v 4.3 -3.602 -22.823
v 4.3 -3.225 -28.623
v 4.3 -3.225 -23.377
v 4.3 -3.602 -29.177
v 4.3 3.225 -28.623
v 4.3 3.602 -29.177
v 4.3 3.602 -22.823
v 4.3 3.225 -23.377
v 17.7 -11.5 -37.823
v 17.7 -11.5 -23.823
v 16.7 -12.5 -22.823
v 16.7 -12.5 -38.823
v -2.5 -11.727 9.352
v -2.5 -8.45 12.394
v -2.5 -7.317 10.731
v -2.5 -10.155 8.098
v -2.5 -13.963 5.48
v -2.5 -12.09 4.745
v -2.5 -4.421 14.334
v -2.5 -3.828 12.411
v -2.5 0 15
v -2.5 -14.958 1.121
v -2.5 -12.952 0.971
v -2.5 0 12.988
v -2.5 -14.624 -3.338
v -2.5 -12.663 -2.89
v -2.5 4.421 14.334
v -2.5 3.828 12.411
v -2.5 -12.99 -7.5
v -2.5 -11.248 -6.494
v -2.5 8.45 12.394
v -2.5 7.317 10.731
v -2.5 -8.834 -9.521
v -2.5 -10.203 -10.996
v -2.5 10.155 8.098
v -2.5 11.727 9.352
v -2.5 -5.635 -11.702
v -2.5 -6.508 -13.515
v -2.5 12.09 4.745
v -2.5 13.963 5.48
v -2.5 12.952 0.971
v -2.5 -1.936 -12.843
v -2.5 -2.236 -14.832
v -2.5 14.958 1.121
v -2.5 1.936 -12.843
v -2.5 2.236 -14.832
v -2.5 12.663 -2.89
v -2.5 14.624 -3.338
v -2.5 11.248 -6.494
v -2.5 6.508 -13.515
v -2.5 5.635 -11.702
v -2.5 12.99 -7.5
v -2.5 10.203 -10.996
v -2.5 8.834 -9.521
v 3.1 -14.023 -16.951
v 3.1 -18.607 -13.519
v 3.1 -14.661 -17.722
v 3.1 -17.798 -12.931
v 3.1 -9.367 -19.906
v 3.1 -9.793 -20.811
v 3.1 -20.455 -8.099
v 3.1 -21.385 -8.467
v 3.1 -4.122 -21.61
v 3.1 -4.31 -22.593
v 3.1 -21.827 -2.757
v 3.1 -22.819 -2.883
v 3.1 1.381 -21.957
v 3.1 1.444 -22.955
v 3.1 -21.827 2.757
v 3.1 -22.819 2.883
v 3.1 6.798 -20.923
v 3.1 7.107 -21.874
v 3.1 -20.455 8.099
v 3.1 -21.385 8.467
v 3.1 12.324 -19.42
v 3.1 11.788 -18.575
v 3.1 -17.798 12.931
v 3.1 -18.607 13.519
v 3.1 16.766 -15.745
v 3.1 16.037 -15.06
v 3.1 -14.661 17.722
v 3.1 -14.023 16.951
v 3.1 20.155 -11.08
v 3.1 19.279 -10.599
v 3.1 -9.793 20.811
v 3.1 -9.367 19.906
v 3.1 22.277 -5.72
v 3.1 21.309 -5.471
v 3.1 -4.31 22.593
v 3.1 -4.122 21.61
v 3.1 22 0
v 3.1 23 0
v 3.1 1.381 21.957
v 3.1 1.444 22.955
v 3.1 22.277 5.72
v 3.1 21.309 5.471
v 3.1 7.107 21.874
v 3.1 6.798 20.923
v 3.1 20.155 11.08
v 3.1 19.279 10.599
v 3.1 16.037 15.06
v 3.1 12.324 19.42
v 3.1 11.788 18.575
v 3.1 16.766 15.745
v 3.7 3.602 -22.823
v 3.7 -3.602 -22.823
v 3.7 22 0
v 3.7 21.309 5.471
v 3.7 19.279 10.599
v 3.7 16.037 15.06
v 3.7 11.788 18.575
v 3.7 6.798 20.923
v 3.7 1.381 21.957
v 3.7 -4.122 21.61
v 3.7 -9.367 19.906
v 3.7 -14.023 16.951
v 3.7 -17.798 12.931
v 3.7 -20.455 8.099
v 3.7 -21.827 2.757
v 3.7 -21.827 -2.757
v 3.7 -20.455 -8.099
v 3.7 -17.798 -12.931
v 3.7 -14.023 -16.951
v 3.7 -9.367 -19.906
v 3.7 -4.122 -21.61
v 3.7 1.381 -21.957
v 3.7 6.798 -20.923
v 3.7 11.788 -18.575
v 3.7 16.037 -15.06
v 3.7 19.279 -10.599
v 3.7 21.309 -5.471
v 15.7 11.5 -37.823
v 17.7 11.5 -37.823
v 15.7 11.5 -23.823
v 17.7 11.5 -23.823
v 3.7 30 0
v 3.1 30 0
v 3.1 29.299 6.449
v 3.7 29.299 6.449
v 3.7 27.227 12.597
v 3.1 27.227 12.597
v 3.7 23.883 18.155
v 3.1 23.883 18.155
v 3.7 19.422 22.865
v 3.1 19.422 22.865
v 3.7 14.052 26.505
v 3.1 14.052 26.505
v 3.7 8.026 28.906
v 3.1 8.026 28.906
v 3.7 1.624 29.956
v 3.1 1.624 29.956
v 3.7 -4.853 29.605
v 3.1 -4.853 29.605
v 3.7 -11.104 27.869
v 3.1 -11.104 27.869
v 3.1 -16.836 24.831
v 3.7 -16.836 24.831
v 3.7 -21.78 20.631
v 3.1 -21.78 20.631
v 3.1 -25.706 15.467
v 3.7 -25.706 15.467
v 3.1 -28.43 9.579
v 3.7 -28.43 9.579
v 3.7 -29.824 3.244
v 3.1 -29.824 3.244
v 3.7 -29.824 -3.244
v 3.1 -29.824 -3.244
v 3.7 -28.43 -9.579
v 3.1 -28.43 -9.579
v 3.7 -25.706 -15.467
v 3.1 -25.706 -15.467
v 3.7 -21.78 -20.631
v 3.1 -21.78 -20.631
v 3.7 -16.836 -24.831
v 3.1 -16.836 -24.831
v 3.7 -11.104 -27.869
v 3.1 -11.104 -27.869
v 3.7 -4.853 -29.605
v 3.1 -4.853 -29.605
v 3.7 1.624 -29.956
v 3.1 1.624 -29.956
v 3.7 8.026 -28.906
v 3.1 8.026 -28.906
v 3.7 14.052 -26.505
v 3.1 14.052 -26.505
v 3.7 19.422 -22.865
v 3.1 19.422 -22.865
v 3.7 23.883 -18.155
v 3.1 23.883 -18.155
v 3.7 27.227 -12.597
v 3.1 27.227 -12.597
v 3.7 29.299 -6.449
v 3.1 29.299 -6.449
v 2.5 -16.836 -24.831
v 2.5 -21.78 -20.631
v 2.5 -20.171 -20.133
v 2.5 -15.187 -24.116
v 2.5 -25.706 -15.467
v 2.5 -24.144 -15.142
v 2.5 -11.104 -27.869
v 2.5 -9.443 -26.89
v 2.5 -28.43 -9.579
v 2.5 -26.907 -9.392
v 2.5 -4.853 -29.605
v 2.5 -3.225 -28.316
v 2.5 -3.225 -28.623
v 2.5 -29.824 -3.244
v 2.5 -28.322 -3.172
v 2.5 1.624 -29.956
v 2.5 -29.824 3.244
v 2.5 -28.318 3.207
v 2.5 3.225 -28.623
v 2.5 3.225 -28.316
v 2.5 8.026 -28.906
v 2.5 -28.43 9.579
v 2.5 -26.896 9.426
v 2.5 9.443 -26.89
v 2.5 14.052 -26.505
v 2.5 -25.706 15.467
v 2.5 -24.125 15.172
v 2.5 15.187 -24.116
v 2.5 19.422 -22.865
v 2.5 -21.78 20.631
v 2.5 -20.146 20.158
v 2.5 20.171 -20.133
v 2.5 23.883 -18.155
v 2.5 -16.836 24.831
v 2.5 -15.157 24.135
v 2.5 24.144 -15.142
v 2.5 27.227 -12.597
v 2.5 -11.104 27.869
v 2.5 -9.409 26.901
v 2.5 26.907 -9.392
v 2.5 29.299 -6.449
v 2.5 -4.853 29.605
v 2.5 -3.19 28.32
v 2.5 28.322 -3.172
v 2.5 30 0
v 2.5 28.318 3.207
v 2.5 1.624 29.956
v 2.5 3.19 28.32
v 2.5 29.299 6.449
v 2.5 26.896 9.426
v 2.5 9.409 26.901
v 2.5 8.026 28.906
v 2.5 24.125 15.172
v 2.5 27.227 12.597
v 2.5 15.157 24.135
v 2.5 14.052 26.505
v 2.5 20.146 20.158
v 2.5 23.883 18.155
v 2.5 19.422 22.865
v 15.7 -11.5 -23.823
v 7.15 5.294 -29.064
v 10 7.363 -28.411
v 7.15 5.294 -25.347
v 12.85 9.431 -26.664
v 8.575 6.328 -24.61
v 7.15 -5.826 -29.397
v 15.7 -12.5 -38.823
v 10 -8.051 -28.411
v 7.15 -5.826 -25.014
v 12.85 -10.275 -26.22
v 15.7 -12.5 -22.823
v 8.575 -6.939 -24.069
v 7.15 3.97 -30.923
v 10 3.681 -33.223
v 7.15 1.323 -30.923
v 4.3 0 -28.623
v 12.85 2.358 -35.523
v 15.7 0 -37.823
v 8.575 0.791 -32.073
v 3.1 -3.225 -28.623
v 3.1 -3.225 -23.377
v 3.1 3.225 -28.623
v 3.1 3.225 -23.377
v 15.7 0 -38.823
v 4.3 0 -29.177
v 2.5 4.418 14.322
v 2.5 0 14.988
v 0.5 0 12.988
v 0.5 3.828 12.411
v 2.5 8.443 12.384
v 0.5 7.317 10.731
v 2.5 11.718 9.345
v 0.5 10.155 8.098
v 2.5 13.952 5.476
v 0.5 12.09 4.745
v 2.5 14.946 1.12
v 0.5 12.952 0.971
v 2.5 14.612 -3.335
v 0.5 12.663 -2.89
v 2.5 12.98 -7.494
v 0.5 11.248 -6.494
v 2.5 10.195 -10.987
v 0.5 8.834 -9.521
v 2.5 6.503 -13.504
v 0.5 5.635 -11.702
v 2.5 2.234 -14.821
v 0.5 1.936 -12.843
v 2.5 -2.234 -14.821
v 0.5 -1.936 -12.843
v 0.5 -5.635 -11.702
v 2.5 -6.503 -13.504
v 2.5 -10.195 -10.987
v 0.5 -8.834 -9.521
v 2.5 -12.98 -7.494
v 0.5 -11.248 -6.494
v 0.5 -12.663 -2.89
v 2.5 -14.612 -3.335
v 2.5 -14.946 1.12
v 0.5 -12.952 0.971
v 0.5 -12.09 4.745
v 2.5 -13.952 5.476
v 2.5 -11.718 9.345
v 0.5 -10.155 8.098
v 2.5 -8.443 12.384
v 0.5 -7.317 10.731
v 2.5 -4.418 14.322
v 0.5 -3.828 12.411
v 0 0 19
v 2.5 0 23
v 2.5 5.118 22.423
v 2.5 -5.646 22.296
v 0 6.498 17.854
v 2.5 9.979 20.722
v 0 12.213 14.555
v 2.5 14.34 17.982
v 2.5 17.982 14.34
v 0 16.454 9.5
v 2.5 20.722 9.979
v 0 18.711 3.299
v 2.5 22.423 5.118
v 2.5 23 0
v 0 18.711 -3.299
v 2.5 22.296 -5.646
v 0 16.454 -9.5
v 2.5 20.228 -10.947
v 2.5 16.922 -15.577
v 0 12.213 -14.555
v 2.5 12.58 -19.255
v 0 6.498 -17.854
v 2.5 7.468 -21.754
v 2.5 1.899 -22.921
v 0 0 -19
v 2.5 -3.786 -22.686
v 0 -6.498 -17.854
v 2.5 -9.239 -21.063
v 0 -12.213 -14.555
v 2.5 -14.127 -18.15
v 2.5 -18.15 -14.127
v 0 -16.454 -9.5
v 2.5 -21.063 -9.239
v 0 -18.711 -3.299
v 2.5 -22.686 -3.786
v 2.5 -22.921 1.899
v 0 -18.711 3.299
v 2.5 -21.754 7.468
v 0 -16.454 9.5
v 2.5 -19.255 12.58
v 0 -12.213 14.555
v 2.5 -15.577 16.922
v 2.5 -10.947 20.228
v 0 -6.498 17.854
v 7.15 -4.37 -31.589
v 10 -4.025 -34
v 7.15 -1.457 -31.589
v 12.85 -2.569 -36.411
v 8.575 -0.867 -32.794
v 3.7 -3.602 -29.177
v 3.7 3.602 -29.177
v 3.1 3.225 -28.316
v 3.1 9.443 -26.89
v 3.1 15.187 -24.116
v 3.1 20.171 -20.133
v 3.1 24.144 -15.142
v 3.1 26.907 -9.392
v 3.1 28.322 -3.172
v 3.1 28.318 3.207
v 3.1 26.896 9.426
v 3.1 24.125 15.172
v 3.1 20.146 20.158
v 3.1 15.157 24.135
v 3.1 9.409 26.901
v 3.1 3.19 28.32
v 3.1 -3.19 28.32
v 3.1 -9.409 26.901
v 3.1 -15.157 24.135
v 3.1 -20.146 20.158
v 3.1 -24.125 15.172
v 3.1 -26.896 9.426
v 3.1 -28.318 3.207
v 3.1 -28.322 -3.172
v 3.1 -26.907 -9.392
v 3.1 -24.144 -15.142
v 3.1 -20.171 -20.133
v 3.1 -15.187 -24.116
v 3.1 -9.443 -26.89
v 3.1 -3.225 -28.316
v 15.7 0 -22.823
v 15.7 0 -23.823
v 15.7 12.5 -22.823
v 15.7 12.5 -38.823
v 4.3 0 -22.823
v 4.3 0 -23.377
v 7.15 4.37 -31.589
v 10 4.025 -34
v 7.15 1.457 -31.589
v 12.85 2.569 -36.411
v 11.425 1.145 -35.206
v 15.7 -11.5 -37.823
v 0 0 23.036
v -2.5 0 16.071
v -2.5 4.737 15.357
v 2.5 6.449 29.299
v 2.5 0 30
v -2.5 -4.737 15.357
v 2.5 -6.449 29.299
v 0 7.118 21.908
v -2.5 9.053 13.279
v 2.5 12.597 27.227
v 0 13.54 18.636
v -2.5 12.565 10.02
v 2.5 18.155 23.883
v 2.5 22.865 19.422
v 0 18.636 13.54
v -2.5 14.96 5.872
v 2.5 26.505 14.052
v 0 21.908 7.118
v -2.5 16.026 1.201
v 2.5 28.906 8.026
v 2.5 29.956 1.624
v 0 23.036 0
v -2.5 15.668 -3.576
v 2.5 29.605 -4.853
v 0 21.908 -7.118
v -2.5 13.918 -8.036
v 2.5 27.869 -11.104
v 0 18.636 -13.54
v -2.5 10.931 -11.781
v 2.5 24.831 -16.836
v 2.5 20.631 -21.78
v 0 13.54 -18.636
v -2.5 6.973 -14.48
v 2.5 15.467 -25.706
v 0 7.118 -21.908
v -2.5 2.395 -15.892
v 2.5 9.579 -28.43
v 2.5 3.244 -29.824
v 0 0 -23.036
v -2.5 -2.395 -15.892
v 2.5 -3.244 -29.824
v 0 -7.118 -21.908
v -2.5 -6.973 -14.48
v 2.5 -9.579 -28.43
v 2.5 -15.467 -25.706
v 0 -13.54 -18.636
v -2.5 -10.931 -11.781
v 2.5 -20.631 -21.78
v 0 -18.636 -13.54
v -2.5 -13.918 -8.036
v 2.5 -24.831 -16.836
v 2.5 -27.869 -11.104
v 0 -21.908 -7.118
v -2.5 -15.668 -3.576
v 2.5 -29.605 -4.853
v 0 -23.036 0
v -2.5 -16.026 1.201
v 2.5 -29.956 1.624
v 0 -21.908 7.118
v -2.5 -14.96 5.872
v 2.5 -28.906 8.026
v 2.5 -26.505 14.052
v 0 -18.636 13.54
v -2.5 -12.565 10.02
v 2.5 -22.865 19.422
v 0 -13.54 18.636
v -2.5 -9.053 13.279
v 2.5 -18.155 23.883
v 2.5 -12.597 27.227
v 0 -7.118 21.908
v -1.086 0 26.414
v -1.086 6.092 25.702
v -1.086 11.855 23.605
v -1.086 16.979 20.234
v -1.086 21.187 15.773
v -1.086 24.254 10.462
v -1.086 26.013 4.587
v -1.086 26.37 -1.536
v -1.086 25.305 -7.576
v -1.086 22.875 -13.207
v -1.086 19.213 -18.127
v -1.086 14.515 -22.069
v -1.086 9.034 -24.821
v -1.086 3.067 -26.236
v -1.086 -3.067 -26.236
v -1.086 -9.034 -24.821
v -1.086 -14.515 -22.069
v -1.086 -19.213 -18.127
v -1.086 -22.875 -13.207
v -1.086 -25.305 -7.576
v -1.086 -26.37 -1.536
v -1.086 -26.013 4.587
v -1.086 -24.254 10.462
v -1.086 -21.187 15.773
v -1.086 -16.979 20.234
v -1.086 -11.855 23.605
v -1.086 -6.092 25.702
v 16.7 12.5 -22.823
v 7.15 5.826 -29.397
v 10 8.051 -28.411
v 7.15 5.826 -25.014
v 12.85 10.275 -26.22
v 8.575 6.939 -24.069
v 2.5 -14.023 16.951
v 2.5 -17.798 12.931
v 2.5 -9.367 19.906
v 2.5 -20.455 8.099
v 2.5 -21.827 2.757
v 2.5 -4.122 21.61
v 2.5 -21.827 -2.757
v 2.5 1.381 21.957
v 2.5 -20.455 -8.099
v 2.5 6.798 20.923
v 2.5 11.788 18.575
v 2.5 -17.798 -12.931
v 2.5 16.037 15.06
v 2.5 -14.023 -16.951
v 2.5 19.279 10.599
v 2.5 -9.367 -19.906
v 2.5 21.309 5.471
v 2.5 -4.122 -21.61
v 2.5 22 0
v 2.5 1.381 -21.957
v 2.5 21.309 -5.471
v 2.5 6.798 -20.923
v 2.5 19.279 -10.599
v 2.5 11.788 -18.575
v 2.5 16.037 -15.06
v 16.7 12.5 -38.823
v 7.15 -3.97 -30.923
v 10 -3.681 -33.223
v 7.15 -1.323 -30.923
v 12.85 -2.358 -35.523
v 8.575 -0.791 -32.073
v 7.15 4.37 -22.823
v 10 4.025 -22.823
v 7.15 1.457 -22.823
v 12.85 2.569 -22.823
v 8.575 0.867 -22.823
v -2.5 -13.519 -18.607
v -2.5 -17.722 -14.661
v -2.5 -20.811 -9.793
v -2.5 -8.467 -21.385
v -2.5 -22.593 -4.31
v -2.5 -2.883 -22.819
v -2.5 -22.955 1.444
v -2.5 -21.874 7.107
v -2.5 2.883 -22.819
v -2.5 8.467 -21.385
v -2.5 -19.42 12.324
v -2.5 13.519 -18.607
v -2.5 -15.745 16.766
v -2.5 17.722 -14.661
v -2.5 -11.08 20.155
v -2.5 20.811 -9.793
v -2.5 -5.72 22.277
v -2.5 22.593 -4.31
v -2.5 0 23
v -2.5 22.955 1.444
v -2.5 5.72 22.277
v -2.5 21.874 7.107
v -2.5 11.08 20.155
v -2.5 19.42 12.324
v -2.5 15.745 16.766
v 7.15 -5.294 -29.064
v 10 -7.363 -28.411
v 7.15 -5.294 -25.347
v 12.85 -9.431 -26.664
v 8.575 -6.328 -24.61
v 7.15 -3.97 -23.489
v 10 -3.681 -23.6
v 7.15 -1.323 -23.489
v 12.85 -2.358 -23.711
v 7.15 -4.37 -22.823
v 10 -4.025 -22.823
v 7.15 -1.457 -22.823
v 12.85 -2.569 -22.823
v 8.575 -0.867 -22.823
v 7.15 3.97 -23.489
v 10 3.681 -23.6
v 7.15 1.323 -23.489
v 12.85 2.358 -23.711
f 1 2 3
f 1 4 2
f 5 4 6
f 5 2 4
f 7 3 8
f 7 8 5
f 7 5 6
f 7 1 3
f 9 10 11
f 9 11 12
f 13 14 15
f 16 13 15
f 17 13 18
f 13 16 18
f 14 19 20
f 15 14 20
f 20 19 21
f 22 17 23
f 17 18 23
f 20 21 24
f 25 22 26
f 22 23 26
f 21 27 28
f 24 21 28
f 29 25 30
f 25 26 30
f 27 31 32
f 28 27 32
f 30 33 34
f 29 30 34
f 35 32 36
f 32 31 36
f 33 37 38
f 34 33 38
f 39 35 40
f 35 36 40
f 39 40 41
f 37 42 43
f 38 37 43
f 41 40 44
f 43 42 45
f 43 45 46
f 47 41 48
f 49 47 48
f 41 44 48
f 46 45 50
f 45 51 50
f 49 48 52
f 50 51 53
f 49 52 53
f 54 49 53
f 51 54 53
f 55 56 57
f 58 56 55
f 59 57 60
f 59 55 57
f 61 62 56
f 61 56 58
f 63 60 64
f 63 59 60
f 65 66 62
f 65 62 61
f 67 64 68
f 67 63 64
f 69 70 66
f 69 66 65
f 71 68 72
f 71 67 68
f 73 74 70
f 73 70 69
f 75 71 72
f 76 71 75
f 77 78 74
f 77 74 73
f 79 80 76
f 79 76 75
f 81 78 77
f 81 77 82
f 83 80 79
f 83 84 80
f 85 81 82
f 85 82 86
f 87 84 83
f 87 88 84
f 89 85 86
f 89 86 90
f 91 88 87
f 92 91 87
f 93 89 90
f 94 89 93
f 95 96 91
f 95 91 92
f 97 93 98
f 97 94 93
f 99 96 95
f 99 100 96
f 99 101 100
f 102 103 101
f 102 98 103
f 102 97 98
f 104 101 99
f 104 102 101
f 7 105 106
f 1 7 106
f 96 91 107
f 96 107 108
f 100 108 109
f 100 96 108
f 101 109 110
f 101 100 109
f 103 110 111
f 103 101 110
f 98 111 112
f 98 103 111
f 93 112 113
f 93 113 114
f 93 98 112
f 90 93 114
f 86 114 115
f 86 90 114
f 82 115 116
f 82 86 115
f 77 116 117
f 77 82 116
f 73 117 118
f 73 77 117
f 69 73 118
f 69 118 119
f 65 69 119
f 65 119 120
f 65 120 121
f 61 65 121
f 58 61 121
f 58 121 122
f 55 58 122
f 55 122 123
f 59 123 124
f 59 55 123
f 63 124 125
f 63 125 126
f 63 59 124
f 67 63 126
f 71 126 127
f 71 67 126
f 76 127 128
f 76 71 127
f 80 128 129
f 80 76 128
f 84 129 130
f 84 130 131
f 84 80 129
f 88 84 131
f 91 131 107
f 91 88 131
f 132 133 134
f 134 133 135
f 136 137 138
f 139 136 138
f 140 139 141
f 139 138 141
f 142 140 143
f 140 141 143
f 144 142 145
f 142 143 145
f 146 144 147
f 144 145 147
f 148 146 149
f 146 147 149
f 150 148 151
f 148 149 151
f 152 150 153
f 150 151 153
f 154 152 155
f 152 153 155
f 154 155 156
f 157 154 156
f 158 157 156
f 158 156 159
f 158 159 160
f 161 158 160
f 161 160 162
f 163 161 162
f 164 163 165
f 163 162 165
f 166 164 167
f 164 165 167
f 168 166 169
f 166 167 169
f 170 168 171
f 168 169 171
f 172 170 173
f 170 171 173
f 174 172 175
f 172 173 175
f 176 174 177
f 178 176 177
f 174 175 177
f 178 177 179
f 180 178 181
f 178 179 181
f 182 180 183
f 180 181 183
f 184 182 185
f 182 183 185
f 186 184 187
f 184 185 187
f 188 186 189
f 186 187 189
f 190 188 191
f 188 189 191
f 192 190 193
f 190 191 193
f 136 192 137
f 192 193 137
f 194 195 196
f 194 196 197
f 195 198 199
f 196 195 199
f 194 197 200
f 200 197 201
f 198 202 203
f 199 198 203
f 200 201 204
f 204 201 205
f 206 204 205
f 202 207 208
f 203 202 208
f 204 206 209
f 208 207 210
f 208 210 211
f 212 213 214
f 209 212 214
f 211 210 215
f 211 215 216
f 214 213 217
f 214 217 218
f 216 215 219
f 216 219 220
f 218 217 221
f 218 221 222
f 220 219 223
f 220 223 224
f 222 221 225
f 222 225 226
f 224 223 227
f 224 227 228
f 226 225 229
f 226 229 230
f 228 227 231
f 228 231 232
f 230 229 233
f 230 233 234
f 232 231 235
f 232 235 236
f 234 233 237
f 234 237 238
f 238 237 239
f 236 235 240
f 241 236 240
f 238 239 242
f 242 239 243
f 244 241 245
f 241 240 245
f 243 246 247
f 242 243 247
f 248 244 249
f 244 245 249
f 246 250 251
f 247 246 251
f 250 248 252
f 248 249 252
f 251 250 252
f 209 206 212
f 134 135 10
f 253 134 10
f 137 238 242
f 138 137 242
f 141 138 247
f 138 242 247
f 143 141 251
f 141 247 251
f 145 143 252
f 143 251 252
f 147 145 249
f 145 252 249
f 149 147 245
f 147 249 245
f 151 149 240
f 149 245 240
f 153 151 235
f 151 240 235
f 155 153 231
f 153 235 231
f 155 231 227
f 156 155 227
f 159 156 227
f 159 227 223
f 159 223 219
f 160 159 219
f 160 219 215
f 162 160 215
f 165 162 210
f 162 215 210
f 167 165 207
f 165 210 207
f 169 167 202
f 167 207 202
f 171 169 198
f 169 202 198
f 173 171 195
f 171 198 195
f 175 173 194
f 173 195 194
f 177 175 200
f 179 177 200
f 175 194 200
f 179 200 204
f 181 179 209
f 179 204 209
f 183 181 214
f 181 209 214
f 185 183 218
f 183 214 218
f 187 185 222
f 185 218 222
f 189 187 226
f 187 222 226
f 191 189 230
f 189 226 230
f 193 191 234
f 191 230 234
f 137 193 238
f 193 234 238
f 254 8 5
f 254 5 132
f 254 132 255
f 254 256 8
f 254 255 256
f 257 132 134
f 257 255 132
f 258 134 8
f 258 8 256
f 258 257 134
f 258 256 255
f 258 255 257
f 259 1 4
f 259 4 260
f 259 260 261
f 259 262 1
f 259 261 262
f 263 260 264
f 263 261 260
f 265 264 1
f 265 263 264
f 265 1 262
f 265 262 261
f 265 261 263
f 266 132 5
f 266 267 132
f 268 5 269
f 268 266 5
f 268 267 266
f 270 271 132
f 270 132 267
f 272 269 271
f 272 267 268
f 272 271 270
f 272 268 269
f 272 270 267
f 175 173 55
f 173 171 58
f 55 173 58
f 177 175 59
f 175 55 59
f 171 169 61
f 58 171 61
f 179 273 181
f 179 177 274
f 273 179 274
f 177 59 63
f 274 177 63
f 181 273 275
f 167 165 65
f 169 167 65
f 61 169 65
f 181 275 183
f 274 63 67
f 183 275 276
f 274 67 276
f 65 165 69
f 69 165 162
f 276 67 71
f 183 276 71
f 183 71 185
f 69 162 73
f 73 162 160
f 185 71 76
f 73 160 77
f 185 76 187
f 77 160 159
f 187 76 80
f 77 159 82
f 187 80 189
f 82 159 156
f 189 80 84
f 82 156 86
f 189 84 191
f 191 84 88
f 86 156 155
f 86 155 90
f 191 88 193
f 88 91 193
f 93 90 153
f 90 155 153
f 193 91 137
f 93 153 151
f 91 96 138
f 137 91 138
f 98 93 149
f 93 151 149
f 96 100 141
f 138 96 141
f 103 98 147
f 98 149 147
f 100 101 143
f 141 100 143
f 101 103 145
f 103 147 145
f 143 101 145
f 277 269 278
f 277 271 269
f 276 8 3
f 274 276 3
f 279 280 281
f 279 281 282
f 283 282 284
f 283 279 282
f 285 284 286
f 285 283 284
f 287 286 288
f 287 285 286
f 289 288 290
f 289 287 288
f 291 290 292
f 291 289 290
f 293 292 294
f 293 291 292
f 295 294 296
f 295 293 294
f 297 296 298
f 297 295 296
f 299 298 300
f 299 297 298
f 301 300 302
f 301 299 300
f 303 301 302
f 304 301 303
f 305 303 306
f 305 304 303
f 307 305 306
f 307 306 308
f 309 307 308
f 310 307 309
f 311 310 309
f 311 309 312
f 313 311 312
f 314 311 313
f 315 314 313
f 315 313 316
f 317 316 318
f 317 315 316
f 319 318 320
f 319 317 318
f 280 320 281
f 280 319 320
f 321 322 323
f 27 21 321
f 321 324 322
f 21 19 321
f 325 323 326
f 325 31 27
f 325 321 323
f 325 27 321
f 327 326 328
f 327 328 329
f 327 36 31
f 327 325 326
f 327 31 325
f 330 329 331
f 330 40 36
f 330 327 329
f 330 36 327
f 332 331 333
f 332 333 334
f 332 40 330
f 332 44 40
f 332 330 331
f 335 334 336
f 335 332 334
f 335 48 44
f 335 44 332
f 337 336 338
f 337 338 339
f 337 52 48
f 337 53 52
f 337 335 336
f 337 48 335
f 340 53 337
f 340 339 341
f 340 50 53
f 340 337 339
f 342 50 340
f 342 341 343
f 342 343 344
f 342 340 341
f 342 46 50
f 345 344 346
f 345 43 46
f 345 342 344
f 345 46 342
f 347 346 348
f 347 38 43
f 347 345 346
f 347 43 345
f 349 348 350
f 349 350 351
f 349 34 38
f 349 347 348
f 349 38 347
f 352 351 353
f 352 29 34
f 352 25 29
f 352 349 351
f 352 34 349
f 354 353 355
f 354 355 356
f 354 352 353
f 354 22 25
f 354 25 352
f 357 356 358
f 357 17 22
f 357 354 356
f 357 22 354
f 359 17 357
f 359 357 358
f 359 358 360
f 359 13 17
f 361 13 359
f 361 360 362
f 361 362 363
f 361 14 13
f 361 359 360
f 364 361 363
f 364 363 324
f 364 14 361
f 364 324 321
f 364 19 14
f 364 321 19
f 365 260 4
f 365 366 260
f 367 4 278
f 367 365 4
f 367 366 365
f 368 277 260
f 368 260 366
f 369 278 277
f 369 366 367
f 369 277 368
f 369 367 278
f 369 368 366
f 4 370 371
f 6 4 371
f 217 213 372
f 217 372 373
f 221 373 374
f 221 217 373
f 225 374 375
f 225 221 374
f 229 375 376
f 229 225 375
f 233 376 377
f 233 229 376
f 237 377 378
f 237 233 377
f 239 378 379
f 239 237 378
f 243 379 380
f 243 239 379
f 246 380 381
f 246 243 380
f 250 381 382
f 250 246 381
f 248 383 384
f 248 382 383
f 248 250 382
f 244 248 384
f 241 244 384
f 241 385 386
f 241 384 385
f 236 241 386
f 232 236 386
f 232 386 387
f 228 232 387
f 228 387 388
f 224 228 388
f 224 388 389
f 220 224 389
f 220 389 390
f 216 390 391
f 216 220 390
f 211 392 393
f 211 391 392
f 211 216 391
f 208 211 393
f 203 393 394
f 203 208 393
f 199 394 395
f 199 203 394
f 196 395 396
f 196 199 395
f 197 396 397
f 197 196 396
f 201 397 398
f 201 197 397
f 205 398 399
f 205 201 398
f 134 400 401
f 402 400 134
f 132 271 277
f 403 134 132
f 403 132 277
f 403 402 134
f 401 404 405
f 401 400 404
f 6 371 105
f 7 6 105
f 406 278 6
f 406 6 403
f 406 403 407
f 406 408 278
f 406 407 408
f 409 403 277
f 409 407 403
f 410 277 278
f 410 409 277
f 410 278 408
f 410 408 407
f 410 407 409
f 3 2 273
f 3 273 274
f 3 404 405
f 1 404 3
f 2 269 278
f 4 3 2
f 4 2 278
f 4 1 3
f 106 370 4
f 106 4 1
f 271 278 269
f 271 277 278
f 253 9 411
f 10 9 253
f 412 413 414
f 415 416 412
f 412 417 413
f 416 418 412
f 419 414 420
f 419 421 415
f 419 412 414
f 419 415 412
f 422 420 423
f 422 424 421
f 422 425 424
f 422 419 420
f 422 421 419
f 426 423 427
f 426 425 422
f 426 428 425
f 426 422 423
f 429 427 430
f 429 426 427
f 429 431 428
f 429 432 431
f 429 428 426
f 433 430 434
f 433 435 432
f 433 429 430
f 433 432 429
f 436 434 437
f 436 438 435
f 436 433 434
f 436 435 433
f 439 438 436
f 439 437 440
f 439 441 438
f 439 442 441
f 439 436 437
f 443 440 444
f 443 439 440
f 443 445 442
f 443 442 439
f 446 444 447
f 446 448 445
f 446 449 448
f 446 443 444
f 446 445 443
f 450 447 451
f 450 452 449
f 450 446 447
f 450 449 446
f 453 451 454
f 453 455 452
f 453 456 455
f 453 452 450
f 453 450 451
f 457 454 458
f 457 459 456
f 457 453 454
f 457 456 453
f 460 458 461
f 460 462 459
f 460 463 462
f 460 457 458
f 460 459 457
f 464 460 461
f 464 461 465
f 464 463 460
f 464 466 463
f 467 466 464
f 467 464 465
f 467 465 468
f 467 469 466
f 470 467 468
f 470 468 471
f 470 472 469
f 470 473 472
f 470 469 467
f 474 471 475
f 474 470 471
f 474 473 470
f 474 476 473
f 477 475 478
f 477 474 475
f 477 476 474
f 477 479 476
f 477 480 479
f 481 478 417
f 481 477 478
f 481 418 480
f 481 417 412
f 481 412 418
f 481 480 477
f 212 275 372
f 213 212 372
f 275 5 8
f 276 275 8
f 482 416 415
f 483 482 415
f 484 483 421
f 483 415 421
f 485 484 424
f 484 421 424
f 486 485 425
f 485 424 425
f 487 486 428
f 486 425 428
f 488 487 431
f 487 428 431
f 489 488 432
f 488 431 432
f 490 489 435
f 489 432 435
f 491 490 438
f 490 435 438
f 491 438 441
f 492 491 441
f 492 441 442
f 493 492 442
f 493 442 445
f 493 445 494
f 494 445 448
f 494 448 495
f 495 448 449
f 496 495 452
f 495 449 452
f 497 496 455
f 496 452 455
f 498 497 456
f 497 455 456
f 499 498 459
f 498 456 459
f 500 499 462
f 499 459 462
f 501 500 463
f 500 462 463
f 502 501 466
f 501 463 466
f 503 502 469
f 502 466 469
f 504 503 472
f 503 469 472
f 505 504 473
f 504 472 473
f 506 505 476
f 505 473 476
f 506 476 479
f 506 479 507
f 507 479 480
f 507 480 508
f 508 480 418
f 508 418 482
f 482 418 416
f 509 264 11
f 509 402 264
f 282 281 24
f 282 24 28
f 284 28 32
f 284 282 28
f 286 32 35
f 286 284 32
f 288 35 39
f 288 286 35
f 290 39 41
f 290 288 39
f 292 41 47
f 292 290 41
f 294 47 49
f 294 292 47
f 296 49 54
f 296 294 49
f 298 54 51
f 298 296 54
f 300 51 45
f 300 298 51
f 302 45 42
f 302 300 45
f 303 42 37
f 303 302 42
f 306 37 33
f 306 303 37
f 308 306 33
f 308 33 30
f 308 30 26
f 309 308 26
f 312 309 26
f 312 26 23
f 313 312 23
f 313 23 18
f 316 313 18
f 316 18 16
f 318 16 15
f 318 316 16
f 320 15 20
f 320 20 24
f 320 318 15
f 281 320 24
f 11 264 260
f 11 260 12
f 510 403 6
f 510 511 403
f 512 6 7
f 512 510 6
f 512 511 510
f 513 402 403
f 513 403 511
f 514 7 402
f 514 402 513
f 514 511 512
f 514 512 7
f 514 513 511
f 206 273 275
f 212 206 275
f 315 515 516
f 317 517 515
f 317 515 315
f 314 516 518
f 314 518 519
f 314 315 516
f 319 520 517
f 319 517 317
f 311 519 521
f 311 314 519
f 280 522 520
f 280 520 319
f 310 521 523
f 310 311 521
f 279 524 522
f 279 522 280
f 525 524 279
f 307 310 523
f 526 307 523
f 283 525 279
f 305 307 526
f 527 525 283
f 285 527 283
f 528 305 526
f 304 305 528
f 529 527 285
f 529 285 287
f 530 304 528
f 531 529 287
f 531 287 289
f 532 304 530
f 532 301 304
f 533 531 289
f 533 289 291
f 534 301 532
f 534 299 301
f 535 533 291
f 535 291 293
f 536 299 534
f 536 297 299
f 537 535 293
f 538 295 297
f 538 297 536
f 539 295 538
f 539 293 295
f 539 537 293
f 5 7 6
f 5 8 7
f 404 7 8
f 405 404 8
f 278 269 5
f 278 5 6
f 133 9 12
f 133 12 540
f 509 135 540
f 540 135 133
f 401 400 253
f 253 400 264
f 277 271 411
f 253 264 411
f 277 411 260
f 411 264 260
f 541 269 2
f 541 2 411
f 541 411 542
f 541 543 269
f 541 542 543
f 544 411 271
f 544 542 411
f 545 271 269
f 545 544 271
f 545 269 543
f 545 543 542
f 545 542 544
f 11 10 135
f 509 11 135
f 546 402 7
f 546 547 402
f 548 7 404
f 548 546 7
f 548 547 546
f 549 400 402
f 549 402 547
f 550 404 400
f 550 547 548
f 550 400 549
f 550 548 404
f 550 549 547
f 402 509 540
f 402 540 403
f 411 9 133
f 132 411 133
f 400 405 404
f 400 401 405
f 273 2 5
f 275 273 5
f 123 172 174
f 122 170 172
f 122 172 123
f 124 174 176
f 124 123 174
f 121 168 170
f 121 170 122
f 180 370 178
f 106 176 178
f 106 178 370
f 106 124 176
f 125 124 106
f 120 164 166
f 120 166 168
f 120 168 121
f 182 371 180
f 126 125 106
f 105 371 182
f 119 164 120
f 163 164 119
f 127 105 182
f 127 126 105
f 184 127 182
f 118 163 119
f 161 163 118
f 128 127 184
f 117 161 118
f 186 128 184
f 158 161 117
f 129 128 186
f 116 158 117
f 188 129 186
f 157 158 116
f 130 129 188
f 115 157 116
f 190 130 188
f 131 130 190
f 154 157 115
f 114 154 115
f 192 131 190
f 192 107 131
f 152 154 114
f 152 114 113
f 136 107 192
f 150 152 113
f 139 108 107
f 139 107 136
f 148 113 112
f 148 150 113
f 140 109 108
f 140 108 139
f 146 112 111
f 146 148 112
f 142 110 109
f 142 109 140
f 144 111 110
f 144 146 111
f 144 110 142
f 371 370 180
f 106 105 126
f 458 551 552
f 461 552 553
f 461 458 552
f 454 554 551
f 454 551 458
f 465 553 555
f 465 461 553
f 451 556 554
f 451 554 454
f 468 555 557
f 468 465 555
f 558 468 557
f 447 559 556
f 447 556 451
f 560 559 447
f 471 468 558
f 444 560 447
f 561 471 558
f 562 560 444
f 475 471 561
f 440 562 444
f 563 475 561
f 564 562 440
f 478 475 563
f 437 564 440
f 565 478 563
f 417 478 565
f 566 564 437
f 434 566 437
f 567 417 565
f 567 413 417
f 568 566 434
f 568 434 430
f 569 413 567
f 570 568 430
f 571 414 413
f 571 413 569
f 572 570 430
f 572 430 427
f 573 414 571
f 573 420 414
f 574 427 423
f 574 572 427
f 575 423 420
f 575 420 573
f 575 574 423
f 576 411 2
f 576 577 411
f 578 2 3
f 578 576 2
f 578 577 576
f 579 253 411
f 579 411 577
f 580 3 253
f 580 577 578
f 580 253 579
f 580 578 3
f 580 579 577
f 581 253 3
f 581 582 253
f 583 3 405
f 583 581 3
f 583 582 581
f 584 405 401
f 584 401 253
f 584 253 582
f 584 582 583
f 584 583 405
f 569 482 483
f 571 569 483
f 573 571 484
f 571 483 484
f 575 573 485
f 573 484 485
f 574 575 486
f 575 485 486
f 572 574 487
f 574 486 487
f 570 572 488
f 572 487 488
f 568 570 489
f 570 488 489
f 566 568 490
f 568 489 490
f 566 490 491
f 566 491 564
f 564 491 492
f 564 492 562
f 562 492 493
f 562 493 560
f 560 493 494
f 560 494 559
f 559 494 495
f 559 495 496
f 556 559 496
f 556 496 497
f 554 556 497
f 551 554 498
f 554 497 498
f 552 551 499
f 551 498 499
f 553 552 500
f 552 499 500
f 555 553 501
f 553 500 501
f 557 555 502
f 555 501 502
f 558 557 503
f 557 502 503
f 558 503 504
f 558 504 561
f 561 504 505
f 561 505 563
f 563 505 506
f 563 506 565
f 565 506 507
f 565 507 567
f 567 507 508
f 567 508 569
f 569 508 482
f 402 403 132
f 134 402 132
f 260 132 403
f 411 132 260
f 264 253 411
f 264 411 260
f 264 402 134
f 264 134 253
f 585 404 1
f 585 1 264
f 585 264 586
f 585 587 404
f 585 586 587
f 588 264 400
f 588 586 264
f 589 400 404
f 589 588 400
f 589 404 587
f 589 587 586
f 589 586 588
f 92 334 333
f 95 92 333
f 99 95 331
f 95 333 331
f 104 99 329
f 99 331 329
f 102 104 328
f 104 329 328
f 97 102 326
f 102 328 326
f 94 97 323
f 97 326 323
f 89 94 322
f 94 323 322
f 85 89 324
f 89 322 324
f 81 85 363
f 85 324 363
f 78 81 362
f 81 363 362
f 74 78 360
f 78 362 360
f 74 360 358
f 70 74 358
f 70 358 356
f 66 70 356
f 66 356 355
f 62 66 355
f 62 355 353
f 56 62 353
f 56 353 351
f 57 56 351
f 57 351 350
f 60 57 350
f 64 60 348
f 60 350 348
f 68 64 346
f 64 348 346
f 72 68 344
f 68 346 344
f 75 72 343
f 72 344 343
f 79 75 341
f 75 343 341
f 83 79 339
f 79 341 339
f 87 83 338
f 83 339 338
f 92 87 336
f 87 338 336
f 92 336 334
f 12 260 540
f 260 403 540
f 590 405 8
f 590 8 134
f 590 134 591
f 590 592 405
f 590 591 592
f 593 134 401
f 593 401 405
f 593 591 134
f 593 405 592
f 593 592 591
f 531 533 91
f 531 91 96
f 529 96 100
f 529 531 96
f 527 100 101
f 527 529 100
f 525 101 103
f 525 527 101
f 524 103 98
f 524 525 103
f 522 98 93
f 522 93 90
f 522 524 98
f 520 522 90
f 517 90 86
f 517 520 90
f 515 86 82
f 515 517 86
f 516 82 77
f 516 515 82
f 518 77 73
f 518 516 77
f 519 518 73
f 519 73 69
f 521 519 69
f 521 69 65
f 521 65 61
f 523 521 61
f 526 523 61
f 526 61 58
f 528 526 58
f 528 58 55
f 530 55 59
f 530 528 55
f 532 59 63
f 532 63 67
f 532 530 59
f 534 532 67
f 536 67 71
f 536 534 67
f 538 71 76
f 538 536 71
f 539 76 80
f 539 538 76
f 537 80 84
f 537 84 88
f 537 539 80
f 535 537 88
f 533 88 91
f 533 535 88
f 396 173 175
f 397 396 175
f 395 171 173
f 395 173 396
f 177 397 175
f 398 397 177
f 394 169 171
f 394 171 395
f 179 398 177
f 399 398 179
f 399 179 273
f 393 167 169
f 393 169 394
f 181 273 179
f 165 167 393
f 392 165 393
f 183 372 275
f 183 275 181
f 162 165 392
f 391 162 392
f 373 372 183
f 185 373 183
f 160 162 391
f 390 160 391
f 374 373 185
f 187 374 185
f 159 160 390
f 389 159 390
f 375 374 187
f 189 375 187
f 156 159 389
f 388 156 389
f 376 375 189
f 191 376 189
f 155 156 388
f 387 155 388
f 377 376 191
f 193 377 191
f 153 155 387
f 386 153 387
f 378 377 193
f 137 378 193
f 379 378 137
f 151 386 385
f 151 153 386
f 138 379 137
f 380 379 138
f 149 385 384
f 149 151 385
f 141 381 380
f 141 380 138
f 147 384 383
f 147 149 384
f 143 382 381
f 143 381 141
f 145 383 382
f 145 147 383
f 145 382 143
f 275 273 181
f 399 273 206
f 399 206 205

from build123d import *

# Parameters (mm, degrees)
F0_W      = 5
F0_H      = 2.0118219405
F2_SIZE   = 4.99999
F3_SIZE   = 2
F4_SIZE   = 2
F5_R      = 23
F5_R_2    = 22
F6_DEPTH  = 0.6
F5_R_3    = 30
F5_R_4    = 28.4994588965
F7_R      = 30
F7_R_2    = 22
F8_DEPTH  = 0.6
F9_W      = 3.6018721294
F9_H      = 6.3549551666
F10_DEPTH = 0.6
F12_DEPTH = 16
F15_W     = 11.5
F15_H     = 14
F16_DEPTH = 25
F14_W     = 11.5
F14_H     = 14
F13_W     = 3.2251703087
F13_H     = 5.2452619672
F18_DEPTH = 25
F21_SIZE  = 0.99999


# Not quite as in the source:
# - a fillet or chamfer is up to 0.001 mm smaller than in the source, because OpenCascade refuses the exact size


with BuildPart() as f1:
    # F0 (on Front) → F1 (revolve)
    with BuildSketch(Plane.XZ):
        Polygon((-2.5, 30), (-2.5, 16.0713382065), (2.5, 30), align=None)
    revolve(axis=Axis((0, 0, 0), (-1, 0, 0)))

    # F2 (size 5 in the source; OpenCascade refuses exactly that, so slightly less here)
    f2_edges = [f1.edges().sort_by_distance(p)[0] for p in [
        (-2.5, 0, -30),
    ]]
    chamfer(f2_edges, length=F2_SIZE)

    # F4
    f4_edges = [f1.edges().sort_by_distance(p)[0] for p in [
        (-2.5, 0, -25.00001),
    ]]
    chamfer(f4_edges, length=F4_SIZE)

    # F14 (on face) → F17 section 0
    with BuildSketch(Plane(origin=(15.7, 0, 0), x_dir=(0, -1, 0), z_dir=(-1, 0, 0))):
        with Locations((5.75, -30.8225224167)):
            Rectangle(F14_W, F14_H)
    # F13 (on face) → F17 section 1
    with BuildSketch(Plane.YZ.offset(4.3)):
        with Locations((-1.6125851544, -26)):
            Rectangle(F13_W, F13_H)
    loft(mode=Mode.SUBTRACT)


with BuildPart() as f1b:
    # F0 (on Front) → F1, piece 2 (revolve)
    with BuildSketch(Plane.XZ):
        Polygon((2.5, 23), (-2.5, 15), (2.5, 15), align=None)
        with Locations((0, 13.9940890297)):
            Rectangle(F0_W, F0_H)
    revolve(axis=Axis((0, 0, 0), (-1, 0, 0)))

    # F3
    f3_edges = [f1b.edges().sort_by_distance(p)[0] for p in [
        (2.5, 0, -12.988178),
    ]]
    chamfer(f3_edges, length=F3_SIZE)

    # F5 (on face) → F6 (join)
    with BuildSketch(Plane.YZ.offset(2.5)):
        Circle(F5_R)
        Circle(F5_R_2, mode=Mode.SUBTRACT)
    extrude(amount=F6_DEPTH)


with BuildPart() as f6:
    # F5 (on face) → F6, piece 2 (new body)
    with BuildSketch(Plane.YZ.offset(2.5)):
        Circle(F5_R_3)
        Circle(F5_R_4, mode=Mode.SUBTRACT)
    extrude(amount=F6_DEPTH)


with BuildPart() as f8:
    # F7 (on face) → F8 (new body)
    with BuildSketch(Plane.YZ.offset(3.1)):
        Circle(F7_R)
        Circle(F7_R_2, mode=Mode.SUBTRACT)
    extrude(amount=F8_DEPTH)

    # F9 (on face) → F10 (join)
    with BuildSketch(Plane.YZ.offset(3.7)):
        with Locations((-1.8009360647, -26)):
            Rectangle(F9_W, F9_H)
        with Locations((1.8009360647, -26)):
            Rectangle(F9_W, F9_H)
    extrude(amount=F10_DEPTH)


with BuildPart() as f12:
    # F11 (on face) → F12 (new body)
    with BuildSketch(Plane.XY.offset(-22.8225224167)):
        Polygon((15.7, -6.078068167), (17.4430608749, -6.078068167), (17.4430608749, 12.5), (15.7, 12.5), (15.7, 0), align=None)
        Polygon((17.4430608749, 12.5), (17.4430608749, -6.078068167), (15.7, -6.078068167), (15.7, -12.5), (17.7, -12.5), (17.7, 12.5), align=None)
    extrude(amount=-F12_DEPTH)

    # F15 (on face) → F16 (cut)
    with BuildSketch(Plane.YZ.offset(17.7)):
        with Locations((5.75, -30.8225224167)):
            Rectangle(F15_W, F15_H)
        with Locations((-5.75, -30.8225224167)):
            Rectangle(F15_W, F15_H)
    extrude(amount=-F16_DEPTH, mode=Mode.SUBTRACT)

    # F21 (size 1 in the source; OpenCascade refuses exactly that, so slightly less here)
    f21_edges = [f12.edges().sort_by_distance(p)[0] for p in [
        (17.7, 0, -22.822522),
        (17.7, 0, -38.822522),
        (17.7, -12.5, -30.822522),
        (17.7, 12.5, -30.822522),
    ]]
    chamfer(f21_edges, length=F21_SIZE)


with BuildPart() as f18_tool:
    # F13 (on face) → F18 (new body)
    with BuildSketch(Plane.YZ.offset(4.3)):
        with Locations((-1.6125851544, -26)):
            Rectangle(F13_W, F13_H)
        with Locations((1.6125851544, -26)):
            Rectangle(F13_W, F13_H)
    extrude(amount=-F18_DEPTH)


with BuildPart() as f6_1:
    add(f6.part)

    # F18: cut by f18_tool
    add(f18_tool.part, mode=Mode.SUBTRACT)


with BuildPart() as f8_1:
    add(f8.part)

    # F18: cut by f18_tool
    add(f18_tool.part, mode=Mode.SUBTRACT)


with BuildPart() as f19:
    # F13 (on face) → F19 section 0
    with BuildSketch(Plane.YZ.offset(4.3)):
        Polygon((0, -23.3773690164), (0, -22.8225224167), (-3.6018721294, -22.8225224167), (-3.6018721294, -29.1774775833), (0, -29.1774775833), (0, -28.6226309836), (-3.2251703087, -28.6226309836), (-3.2251703087, -23.3773690164), align=None)
    # F14 (on face) → F19 section 1
    with BuildSketch(Plane(origin=(15.7, 0, 0), x_dir=(0, -1, 0), z_dir=(-1, 0, 0))):
        Polygon((0, -37.8225224167), (0, -38.8225224167), (12.5, -38.8225224167), (12.5, -22.8225224167), (0, -22.8225224167), (0, -23.8225224167), (11.5, -23.8225224167), (11.5, -37.8225224167), align=None)
    loft()


with BuildPart() as f20:
    # F13 (on face) → F20 section 0
    with BuildSketch(Plane.YZ.offset(4.3)):
        Polygon((3.6018721294, -22.8225224167), (0, -22.8225224167), (0, -23.3773690164), (3.2251703087, -23.3773690164), (3.2251703087, -28.6226309836), (0, -28.6226309836), (0, -29.1774775833), (3.6018721294, -29.1774775833), align=None)
    # F14 (on face) → F20 section 1
    with BuildSketch(Plane(origin=(15.7, 0, 0), x_dir=(0, -1, 0), z_dir=(-1, 0, 0))):
        Polygon((-12.5, -38.8225224167), (0, -38.8225224167), (0, -37.8225224167), (-11.5, -37.8225224167), (-11.5, -23.8225224167), (0, -23.8225224167), (0, -22.8225224167), (-12.5, -22.8225224167), align=None)
    loft()


solid = Compound([f1.part, f1b.part, f12.part, f6_1.part, f8_1.part, f19.part, f20.part])
